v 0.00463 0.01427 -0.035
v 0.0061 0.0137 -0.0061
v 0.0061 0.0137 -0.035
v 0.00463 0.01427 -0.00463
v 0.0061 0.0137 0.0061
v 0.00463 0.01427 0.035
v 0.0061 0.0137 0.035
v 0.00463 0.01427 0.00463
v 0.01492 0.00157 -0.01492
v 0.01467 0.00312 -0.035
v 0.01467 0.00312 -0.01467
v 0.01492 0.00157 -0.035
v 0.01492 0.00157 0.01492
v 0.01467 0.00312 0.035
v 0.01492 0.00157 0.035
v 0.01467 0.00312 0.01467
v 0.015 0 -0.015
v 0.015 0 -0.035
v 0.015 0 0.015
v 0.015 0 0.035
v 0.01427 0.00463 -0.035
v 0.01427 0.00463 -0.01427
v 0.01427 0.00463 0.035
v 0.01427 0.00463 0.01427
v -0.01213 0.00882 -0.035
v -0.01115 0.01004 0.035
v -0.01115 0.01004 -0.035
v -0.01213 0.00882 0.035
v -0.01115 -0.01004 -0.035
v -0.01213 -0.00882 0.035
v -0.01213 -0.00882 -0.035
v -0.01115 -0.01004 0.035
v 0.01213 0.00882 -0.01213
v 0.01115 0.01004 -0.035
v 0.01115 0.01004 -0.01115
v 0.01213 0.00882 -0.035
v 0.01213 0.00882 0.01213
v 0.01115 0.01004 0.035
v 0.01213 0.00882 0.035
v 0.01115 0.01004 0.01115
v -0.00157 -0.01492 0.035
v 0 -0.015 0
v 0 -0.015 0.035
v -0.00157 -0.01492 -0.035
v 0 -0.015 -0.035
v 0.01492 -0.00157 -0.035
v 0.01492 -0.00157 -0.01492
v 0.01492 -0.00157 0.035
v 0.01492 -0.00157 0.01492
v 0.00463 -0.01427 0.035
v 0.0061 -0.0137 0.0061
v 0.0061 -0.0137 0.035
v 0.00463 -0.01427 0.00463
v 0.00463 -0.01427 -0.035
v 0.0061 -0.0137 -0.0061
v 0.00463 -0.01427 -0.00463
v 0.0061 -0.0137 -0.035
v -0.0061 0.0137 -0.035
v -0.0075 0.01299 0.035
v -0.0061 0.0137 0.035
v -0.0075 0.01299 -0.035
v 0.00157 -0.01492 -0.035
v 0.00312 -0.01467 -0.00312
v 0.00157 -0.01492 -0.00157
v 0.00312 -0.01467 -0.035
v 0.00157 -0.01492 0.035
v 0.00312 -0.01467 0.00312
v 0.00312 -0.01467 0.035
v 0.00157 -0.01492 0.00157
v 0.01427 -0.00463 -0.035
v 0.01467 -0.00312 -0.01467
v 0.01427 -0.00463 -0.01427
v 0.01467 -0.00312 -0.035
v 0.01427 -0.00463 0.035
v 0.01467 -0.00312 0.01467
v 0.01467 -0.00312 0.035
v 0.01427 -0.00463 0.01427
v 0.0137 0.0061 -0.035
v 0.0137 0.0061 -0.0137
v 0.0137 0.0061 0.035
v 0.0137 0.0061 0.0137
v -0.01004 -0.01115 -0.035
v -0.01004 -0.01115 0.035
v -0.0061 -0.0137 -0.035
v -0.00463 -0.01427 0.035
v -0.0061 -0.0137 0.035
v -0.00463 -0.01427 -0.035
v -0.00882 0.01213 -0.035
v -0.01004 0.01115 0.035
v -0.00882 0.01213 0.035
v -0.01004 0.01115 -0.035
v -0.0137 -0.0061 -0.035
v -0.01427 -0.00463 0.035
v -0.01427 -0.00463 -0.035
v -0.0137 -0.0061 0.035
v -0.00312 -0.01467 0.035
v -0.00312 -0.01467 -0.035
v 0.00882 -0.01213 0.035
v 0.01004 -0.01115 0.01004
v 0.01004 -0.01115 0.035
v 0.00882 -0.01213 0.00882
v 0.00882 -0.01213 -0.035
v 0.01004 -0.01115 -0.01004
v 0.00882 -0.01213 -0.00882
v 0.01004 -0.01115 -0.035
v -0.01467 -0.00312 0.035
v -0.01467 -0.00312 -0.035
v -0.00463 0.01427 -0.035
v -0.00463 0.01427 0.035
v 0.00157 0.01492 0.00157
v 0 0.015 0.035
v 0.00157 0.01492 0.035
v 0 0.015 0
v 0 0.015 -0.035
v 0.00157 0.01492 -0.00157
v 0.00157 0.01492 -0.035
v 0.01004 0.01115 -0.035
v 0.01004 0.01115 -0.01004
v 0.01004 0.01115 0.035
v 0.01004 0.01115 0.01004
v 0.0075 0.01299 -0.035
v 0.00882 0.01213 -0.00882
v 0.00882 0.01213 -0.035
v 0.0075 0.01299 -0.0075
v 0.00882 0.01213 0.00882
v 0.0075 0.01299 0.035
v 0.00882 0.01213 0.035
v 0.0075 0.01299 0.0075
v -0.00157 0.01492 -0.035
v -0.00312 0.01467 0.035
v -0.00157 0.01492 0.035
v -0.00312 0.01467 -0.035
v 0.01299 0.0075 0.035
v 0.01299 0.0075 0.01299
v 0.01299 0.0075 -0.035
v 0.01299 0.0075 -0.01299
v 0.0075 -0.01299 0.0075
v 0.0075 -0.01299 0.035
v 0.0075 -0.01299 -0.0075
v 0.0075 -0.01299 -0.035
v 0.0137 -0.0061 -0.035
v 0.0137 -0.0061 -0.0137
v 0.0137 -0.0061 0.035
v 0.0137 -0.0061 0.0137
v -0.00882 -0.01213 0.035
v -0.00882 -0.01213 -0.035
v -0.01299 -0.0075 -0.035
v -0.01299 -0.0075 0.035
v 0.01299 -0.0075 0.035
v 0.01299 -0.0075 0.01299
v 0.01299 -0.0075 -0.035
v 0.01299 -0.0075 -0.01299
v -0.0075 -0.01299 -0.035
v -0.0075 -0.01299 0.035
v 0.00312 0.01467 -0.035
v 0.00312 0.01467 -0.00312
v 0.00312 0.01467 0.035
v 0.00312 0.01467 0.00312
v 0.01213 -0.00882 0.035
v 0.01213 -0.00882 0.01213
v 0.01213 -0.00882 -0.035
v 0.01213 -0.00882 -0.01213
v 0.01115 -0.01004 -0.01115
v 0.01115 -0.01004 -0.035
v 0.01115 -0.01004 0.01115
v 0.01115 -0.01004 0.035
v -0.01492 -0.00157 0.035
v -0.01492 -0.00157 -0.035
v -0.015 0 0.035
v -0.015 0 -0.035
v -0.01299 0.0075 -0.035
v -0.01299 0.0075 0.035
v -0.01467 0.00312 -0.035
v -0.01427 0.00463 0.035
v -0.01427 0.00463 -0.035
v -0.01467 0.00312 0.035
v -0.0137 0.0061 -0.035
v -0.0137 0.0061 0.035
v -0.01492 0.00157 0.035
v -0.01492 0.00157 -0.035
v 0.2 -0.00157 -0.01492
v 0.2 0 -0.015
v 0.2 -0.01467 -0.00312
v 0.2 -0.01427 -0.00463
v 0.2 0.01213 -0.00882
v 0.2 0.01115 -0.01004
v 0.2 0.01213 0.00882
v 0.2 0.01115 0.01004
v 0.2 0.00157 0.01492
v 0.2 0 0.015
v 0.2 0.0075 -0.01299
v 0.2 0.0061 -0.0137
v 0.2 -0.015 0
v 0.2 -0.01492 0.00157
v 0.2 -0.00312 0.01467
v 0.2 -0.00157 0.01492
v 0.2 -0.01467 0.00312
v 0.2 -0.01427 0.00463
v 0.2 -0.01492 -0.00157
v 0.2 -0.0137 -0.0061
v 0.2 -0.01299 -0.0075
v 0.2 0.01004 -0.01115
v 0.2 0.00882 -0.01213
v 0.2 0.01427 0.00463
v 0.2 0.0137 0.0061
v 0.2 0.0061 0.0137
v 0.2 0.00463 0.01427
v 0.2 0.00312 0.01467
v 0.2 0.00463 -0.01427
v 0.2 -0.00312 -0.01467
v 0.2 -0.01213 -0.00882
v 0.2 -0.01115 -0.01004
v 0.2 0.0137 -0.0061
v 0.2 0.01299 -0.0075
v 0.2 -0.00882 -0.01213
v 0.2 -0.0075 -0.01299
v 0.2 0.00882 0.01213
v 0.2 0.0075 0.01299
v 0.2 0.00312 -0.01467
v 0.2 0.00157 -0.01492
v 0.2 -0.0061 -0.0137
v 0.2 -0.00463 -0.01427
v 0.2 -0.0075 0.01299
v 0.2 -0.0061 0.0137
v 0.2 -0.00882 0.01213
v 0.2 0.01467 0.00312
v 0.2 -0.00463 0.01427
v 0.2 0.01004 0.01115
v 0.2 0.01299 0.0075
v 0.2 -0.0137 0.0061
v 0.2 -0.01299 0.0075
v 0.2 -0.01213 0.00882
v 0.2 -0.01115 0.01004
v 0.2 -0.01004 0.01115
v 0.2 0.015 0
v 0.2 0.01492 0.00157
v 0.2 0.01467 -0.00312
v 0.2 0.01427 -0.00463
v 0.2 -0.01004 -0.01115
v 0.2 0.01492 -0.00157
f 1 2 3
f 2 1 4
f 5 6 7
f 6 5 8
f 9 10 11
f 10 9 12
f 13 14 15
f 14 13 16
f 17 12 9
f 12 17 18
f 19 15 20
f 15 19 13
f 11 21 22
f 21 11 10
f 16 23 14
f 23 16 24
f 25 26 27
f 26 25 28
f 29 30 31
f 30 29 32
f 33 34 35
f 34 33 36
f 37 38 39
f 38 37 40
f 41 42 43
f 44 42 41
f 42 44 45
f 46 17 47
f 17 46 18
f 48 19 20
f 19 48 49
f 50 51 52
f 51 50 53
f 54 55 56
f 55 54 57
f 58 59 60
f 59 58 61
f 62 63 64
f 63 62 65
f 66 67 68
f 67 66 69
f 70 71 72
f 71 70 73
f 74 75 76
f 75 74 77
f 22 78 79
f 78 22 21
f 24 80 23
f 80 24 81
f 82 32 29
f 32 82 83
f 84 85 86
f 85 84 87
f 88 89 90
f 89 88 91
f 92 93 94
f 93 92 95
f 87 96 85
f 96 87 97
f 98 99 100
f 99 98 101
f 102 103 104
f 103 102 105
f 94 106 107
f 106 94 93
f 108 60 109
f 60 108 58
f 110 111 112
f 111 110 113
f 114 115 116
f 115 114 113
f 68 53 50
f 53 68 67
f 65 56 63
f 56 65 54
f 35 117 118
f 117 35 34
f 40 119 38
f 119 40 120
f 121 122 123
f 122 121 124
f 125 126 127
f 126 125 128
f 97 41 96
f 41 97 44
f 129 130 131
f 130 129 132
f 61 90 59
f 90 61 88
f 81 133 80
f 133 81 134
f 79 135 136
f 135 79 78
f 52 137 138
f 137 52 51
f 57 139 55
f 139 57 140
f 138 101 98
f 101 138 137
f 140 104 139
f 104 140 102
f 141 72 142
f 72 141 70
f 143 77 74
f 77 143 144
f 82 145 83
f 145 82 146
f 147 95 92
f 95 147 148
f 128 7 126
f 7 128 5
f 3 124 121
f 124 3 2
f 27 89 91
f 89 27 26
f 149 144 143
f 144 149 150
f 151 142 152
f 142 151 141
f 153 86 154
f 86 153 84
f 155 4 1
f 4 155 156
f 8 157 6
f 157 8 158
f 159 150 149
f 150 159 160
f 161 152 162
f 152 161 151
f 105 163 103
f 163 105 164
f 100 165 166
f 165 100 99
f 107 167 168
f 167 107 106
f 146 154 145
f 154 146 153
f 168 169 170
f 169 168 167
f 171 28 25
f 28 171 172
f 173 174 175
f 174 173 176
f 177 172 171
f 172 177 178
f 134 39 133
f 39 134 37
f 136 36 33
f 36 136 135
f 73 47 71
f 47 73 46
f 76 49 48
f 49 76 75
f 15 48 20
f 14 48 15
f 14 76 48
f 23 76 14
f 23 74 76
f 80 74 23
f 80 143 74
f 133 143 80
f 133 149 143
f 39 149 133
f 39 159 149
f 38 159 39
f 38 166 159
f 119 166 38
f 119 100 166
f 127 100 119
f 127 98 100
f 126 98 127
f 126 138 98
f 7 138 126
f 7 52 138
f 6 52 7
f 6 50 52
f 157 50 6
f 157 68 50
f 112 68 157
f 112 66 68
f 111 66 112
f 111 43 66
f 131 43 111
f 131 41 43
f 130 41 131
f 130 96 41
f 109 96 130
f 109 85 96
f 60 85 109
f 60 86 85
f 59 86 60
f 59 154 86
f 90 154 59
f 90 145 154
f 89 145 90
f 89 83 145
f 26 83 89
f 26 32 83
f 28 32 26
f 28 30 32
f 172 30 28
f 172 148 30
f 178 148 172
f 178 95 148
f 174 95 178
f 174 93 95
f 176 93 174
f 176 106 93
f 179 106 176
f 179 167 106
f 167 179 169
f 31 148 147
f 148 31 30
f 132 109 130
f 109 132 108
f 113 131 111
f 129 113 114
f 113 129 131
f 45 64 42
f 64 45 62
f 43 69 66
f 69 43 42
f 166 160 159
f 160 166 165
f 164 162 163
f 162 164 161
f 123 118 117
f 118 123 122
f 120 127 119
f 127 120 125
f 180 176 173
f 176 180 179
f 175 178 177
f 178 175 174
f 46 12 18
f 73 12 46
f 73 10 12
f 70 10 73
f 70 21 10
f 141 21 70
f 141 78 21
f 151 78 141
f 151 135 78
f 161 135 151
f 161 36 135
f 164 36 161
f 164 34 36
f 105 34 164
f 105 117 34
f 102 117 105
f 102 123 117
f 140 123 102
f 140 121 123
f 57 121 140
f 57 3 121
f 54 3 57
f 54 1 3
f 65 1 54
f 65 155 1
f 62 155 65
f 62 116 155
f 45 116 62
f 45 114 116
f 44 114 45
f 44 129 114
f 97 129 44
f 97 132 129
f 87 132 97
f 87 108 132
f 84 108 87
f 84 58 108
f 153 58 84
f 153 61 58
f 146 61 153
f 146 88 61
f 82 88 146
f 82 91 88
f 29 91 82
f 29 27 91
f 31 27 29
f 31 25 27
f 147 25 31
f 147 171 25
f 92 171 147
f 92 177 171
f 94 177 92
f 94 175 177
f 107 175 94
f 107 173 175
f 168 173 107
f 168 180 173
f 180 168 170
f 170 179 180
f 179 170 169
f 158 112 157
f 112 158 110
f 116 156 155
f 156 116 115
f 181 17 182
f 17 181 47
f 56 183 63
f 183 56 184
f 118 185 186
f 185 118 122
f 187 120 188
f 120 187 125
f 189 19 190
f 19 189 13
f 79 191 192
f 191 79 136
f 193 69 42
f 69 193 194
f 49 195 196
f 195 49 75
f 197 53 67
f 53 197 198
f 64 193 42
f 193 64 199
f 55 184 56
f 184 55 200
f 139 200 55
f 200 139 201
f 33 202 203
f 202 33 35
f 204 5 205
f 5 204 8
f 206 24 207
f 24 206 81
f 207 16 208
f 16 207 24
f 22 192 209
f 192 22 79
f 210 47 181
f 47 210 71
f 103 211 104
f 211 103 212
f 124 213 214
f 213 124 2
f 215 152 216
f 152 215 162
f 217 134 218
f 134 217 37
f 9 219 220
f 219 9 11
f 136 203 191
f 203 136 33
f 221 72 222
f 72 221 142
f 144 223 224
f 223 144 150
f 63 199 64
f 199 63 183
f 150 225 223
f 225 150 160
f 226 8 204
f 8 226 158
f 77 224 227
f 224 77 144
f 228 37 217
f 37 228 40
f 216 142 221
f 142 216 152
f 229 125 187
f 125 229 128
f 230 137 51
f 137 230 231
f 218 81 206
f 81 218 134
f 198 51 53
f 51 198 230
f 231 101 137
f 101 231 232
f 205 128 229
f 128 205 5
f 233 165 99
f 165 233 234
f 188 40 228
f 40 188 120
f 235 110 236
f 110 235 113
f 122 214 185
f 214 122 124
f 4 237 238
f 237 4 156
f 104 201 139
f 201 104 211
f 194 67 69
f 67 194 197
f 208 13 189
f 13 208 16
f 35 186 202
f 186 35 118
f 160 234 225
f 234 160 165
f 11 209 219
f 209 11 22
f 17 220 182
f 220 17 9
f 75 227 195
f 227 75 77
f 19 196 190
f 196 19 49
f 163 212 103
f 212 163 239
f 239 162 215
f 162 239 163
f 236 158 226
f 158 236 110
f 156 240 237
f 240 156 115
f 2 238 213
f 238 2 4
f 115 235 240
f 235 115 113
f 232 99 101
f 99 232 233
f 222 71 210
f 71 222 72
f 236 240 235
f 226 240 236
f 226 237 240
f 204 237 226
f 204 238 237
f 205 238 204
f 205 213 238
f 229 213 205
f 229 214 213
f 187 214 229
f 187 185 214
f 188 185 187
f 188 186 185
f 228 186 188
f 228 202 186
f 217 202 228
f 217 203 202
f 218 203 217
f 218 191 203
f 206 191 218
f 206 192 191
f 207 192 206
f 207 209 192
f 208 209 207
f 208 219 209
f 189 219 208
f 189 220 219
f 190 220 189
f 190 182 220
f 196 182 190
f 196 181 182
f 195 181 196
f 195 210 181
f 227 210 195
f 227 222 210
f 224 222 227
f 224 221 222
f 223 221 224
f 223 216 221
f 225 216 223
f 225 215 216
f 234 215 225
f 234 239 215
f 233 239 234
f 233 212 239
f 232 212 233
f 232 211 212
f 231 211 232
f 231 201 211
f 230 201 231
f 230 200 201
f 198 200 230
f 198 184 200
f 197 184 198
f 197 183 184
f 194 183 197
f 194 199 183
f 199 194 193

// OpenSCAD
// link 2
// base cylinder
hb = 0.07;
rb= 0.015;
translate(v=[0, 0, -hb/2]){
 rotate(a=[0, 0, 0]){
  cylinder($fn=60, h=hb, r1=rb, r2=rb, center=false);
 }
}

// arm cylinder
ha = 0.20;
ra= 0.015;
translate(v=[0, 0, 0]){
 rotate(a=[-90, 0, -90]){
  cylinder($fn=60, h=ha, r1=ra, r2=ra, center=false);
 }
}
